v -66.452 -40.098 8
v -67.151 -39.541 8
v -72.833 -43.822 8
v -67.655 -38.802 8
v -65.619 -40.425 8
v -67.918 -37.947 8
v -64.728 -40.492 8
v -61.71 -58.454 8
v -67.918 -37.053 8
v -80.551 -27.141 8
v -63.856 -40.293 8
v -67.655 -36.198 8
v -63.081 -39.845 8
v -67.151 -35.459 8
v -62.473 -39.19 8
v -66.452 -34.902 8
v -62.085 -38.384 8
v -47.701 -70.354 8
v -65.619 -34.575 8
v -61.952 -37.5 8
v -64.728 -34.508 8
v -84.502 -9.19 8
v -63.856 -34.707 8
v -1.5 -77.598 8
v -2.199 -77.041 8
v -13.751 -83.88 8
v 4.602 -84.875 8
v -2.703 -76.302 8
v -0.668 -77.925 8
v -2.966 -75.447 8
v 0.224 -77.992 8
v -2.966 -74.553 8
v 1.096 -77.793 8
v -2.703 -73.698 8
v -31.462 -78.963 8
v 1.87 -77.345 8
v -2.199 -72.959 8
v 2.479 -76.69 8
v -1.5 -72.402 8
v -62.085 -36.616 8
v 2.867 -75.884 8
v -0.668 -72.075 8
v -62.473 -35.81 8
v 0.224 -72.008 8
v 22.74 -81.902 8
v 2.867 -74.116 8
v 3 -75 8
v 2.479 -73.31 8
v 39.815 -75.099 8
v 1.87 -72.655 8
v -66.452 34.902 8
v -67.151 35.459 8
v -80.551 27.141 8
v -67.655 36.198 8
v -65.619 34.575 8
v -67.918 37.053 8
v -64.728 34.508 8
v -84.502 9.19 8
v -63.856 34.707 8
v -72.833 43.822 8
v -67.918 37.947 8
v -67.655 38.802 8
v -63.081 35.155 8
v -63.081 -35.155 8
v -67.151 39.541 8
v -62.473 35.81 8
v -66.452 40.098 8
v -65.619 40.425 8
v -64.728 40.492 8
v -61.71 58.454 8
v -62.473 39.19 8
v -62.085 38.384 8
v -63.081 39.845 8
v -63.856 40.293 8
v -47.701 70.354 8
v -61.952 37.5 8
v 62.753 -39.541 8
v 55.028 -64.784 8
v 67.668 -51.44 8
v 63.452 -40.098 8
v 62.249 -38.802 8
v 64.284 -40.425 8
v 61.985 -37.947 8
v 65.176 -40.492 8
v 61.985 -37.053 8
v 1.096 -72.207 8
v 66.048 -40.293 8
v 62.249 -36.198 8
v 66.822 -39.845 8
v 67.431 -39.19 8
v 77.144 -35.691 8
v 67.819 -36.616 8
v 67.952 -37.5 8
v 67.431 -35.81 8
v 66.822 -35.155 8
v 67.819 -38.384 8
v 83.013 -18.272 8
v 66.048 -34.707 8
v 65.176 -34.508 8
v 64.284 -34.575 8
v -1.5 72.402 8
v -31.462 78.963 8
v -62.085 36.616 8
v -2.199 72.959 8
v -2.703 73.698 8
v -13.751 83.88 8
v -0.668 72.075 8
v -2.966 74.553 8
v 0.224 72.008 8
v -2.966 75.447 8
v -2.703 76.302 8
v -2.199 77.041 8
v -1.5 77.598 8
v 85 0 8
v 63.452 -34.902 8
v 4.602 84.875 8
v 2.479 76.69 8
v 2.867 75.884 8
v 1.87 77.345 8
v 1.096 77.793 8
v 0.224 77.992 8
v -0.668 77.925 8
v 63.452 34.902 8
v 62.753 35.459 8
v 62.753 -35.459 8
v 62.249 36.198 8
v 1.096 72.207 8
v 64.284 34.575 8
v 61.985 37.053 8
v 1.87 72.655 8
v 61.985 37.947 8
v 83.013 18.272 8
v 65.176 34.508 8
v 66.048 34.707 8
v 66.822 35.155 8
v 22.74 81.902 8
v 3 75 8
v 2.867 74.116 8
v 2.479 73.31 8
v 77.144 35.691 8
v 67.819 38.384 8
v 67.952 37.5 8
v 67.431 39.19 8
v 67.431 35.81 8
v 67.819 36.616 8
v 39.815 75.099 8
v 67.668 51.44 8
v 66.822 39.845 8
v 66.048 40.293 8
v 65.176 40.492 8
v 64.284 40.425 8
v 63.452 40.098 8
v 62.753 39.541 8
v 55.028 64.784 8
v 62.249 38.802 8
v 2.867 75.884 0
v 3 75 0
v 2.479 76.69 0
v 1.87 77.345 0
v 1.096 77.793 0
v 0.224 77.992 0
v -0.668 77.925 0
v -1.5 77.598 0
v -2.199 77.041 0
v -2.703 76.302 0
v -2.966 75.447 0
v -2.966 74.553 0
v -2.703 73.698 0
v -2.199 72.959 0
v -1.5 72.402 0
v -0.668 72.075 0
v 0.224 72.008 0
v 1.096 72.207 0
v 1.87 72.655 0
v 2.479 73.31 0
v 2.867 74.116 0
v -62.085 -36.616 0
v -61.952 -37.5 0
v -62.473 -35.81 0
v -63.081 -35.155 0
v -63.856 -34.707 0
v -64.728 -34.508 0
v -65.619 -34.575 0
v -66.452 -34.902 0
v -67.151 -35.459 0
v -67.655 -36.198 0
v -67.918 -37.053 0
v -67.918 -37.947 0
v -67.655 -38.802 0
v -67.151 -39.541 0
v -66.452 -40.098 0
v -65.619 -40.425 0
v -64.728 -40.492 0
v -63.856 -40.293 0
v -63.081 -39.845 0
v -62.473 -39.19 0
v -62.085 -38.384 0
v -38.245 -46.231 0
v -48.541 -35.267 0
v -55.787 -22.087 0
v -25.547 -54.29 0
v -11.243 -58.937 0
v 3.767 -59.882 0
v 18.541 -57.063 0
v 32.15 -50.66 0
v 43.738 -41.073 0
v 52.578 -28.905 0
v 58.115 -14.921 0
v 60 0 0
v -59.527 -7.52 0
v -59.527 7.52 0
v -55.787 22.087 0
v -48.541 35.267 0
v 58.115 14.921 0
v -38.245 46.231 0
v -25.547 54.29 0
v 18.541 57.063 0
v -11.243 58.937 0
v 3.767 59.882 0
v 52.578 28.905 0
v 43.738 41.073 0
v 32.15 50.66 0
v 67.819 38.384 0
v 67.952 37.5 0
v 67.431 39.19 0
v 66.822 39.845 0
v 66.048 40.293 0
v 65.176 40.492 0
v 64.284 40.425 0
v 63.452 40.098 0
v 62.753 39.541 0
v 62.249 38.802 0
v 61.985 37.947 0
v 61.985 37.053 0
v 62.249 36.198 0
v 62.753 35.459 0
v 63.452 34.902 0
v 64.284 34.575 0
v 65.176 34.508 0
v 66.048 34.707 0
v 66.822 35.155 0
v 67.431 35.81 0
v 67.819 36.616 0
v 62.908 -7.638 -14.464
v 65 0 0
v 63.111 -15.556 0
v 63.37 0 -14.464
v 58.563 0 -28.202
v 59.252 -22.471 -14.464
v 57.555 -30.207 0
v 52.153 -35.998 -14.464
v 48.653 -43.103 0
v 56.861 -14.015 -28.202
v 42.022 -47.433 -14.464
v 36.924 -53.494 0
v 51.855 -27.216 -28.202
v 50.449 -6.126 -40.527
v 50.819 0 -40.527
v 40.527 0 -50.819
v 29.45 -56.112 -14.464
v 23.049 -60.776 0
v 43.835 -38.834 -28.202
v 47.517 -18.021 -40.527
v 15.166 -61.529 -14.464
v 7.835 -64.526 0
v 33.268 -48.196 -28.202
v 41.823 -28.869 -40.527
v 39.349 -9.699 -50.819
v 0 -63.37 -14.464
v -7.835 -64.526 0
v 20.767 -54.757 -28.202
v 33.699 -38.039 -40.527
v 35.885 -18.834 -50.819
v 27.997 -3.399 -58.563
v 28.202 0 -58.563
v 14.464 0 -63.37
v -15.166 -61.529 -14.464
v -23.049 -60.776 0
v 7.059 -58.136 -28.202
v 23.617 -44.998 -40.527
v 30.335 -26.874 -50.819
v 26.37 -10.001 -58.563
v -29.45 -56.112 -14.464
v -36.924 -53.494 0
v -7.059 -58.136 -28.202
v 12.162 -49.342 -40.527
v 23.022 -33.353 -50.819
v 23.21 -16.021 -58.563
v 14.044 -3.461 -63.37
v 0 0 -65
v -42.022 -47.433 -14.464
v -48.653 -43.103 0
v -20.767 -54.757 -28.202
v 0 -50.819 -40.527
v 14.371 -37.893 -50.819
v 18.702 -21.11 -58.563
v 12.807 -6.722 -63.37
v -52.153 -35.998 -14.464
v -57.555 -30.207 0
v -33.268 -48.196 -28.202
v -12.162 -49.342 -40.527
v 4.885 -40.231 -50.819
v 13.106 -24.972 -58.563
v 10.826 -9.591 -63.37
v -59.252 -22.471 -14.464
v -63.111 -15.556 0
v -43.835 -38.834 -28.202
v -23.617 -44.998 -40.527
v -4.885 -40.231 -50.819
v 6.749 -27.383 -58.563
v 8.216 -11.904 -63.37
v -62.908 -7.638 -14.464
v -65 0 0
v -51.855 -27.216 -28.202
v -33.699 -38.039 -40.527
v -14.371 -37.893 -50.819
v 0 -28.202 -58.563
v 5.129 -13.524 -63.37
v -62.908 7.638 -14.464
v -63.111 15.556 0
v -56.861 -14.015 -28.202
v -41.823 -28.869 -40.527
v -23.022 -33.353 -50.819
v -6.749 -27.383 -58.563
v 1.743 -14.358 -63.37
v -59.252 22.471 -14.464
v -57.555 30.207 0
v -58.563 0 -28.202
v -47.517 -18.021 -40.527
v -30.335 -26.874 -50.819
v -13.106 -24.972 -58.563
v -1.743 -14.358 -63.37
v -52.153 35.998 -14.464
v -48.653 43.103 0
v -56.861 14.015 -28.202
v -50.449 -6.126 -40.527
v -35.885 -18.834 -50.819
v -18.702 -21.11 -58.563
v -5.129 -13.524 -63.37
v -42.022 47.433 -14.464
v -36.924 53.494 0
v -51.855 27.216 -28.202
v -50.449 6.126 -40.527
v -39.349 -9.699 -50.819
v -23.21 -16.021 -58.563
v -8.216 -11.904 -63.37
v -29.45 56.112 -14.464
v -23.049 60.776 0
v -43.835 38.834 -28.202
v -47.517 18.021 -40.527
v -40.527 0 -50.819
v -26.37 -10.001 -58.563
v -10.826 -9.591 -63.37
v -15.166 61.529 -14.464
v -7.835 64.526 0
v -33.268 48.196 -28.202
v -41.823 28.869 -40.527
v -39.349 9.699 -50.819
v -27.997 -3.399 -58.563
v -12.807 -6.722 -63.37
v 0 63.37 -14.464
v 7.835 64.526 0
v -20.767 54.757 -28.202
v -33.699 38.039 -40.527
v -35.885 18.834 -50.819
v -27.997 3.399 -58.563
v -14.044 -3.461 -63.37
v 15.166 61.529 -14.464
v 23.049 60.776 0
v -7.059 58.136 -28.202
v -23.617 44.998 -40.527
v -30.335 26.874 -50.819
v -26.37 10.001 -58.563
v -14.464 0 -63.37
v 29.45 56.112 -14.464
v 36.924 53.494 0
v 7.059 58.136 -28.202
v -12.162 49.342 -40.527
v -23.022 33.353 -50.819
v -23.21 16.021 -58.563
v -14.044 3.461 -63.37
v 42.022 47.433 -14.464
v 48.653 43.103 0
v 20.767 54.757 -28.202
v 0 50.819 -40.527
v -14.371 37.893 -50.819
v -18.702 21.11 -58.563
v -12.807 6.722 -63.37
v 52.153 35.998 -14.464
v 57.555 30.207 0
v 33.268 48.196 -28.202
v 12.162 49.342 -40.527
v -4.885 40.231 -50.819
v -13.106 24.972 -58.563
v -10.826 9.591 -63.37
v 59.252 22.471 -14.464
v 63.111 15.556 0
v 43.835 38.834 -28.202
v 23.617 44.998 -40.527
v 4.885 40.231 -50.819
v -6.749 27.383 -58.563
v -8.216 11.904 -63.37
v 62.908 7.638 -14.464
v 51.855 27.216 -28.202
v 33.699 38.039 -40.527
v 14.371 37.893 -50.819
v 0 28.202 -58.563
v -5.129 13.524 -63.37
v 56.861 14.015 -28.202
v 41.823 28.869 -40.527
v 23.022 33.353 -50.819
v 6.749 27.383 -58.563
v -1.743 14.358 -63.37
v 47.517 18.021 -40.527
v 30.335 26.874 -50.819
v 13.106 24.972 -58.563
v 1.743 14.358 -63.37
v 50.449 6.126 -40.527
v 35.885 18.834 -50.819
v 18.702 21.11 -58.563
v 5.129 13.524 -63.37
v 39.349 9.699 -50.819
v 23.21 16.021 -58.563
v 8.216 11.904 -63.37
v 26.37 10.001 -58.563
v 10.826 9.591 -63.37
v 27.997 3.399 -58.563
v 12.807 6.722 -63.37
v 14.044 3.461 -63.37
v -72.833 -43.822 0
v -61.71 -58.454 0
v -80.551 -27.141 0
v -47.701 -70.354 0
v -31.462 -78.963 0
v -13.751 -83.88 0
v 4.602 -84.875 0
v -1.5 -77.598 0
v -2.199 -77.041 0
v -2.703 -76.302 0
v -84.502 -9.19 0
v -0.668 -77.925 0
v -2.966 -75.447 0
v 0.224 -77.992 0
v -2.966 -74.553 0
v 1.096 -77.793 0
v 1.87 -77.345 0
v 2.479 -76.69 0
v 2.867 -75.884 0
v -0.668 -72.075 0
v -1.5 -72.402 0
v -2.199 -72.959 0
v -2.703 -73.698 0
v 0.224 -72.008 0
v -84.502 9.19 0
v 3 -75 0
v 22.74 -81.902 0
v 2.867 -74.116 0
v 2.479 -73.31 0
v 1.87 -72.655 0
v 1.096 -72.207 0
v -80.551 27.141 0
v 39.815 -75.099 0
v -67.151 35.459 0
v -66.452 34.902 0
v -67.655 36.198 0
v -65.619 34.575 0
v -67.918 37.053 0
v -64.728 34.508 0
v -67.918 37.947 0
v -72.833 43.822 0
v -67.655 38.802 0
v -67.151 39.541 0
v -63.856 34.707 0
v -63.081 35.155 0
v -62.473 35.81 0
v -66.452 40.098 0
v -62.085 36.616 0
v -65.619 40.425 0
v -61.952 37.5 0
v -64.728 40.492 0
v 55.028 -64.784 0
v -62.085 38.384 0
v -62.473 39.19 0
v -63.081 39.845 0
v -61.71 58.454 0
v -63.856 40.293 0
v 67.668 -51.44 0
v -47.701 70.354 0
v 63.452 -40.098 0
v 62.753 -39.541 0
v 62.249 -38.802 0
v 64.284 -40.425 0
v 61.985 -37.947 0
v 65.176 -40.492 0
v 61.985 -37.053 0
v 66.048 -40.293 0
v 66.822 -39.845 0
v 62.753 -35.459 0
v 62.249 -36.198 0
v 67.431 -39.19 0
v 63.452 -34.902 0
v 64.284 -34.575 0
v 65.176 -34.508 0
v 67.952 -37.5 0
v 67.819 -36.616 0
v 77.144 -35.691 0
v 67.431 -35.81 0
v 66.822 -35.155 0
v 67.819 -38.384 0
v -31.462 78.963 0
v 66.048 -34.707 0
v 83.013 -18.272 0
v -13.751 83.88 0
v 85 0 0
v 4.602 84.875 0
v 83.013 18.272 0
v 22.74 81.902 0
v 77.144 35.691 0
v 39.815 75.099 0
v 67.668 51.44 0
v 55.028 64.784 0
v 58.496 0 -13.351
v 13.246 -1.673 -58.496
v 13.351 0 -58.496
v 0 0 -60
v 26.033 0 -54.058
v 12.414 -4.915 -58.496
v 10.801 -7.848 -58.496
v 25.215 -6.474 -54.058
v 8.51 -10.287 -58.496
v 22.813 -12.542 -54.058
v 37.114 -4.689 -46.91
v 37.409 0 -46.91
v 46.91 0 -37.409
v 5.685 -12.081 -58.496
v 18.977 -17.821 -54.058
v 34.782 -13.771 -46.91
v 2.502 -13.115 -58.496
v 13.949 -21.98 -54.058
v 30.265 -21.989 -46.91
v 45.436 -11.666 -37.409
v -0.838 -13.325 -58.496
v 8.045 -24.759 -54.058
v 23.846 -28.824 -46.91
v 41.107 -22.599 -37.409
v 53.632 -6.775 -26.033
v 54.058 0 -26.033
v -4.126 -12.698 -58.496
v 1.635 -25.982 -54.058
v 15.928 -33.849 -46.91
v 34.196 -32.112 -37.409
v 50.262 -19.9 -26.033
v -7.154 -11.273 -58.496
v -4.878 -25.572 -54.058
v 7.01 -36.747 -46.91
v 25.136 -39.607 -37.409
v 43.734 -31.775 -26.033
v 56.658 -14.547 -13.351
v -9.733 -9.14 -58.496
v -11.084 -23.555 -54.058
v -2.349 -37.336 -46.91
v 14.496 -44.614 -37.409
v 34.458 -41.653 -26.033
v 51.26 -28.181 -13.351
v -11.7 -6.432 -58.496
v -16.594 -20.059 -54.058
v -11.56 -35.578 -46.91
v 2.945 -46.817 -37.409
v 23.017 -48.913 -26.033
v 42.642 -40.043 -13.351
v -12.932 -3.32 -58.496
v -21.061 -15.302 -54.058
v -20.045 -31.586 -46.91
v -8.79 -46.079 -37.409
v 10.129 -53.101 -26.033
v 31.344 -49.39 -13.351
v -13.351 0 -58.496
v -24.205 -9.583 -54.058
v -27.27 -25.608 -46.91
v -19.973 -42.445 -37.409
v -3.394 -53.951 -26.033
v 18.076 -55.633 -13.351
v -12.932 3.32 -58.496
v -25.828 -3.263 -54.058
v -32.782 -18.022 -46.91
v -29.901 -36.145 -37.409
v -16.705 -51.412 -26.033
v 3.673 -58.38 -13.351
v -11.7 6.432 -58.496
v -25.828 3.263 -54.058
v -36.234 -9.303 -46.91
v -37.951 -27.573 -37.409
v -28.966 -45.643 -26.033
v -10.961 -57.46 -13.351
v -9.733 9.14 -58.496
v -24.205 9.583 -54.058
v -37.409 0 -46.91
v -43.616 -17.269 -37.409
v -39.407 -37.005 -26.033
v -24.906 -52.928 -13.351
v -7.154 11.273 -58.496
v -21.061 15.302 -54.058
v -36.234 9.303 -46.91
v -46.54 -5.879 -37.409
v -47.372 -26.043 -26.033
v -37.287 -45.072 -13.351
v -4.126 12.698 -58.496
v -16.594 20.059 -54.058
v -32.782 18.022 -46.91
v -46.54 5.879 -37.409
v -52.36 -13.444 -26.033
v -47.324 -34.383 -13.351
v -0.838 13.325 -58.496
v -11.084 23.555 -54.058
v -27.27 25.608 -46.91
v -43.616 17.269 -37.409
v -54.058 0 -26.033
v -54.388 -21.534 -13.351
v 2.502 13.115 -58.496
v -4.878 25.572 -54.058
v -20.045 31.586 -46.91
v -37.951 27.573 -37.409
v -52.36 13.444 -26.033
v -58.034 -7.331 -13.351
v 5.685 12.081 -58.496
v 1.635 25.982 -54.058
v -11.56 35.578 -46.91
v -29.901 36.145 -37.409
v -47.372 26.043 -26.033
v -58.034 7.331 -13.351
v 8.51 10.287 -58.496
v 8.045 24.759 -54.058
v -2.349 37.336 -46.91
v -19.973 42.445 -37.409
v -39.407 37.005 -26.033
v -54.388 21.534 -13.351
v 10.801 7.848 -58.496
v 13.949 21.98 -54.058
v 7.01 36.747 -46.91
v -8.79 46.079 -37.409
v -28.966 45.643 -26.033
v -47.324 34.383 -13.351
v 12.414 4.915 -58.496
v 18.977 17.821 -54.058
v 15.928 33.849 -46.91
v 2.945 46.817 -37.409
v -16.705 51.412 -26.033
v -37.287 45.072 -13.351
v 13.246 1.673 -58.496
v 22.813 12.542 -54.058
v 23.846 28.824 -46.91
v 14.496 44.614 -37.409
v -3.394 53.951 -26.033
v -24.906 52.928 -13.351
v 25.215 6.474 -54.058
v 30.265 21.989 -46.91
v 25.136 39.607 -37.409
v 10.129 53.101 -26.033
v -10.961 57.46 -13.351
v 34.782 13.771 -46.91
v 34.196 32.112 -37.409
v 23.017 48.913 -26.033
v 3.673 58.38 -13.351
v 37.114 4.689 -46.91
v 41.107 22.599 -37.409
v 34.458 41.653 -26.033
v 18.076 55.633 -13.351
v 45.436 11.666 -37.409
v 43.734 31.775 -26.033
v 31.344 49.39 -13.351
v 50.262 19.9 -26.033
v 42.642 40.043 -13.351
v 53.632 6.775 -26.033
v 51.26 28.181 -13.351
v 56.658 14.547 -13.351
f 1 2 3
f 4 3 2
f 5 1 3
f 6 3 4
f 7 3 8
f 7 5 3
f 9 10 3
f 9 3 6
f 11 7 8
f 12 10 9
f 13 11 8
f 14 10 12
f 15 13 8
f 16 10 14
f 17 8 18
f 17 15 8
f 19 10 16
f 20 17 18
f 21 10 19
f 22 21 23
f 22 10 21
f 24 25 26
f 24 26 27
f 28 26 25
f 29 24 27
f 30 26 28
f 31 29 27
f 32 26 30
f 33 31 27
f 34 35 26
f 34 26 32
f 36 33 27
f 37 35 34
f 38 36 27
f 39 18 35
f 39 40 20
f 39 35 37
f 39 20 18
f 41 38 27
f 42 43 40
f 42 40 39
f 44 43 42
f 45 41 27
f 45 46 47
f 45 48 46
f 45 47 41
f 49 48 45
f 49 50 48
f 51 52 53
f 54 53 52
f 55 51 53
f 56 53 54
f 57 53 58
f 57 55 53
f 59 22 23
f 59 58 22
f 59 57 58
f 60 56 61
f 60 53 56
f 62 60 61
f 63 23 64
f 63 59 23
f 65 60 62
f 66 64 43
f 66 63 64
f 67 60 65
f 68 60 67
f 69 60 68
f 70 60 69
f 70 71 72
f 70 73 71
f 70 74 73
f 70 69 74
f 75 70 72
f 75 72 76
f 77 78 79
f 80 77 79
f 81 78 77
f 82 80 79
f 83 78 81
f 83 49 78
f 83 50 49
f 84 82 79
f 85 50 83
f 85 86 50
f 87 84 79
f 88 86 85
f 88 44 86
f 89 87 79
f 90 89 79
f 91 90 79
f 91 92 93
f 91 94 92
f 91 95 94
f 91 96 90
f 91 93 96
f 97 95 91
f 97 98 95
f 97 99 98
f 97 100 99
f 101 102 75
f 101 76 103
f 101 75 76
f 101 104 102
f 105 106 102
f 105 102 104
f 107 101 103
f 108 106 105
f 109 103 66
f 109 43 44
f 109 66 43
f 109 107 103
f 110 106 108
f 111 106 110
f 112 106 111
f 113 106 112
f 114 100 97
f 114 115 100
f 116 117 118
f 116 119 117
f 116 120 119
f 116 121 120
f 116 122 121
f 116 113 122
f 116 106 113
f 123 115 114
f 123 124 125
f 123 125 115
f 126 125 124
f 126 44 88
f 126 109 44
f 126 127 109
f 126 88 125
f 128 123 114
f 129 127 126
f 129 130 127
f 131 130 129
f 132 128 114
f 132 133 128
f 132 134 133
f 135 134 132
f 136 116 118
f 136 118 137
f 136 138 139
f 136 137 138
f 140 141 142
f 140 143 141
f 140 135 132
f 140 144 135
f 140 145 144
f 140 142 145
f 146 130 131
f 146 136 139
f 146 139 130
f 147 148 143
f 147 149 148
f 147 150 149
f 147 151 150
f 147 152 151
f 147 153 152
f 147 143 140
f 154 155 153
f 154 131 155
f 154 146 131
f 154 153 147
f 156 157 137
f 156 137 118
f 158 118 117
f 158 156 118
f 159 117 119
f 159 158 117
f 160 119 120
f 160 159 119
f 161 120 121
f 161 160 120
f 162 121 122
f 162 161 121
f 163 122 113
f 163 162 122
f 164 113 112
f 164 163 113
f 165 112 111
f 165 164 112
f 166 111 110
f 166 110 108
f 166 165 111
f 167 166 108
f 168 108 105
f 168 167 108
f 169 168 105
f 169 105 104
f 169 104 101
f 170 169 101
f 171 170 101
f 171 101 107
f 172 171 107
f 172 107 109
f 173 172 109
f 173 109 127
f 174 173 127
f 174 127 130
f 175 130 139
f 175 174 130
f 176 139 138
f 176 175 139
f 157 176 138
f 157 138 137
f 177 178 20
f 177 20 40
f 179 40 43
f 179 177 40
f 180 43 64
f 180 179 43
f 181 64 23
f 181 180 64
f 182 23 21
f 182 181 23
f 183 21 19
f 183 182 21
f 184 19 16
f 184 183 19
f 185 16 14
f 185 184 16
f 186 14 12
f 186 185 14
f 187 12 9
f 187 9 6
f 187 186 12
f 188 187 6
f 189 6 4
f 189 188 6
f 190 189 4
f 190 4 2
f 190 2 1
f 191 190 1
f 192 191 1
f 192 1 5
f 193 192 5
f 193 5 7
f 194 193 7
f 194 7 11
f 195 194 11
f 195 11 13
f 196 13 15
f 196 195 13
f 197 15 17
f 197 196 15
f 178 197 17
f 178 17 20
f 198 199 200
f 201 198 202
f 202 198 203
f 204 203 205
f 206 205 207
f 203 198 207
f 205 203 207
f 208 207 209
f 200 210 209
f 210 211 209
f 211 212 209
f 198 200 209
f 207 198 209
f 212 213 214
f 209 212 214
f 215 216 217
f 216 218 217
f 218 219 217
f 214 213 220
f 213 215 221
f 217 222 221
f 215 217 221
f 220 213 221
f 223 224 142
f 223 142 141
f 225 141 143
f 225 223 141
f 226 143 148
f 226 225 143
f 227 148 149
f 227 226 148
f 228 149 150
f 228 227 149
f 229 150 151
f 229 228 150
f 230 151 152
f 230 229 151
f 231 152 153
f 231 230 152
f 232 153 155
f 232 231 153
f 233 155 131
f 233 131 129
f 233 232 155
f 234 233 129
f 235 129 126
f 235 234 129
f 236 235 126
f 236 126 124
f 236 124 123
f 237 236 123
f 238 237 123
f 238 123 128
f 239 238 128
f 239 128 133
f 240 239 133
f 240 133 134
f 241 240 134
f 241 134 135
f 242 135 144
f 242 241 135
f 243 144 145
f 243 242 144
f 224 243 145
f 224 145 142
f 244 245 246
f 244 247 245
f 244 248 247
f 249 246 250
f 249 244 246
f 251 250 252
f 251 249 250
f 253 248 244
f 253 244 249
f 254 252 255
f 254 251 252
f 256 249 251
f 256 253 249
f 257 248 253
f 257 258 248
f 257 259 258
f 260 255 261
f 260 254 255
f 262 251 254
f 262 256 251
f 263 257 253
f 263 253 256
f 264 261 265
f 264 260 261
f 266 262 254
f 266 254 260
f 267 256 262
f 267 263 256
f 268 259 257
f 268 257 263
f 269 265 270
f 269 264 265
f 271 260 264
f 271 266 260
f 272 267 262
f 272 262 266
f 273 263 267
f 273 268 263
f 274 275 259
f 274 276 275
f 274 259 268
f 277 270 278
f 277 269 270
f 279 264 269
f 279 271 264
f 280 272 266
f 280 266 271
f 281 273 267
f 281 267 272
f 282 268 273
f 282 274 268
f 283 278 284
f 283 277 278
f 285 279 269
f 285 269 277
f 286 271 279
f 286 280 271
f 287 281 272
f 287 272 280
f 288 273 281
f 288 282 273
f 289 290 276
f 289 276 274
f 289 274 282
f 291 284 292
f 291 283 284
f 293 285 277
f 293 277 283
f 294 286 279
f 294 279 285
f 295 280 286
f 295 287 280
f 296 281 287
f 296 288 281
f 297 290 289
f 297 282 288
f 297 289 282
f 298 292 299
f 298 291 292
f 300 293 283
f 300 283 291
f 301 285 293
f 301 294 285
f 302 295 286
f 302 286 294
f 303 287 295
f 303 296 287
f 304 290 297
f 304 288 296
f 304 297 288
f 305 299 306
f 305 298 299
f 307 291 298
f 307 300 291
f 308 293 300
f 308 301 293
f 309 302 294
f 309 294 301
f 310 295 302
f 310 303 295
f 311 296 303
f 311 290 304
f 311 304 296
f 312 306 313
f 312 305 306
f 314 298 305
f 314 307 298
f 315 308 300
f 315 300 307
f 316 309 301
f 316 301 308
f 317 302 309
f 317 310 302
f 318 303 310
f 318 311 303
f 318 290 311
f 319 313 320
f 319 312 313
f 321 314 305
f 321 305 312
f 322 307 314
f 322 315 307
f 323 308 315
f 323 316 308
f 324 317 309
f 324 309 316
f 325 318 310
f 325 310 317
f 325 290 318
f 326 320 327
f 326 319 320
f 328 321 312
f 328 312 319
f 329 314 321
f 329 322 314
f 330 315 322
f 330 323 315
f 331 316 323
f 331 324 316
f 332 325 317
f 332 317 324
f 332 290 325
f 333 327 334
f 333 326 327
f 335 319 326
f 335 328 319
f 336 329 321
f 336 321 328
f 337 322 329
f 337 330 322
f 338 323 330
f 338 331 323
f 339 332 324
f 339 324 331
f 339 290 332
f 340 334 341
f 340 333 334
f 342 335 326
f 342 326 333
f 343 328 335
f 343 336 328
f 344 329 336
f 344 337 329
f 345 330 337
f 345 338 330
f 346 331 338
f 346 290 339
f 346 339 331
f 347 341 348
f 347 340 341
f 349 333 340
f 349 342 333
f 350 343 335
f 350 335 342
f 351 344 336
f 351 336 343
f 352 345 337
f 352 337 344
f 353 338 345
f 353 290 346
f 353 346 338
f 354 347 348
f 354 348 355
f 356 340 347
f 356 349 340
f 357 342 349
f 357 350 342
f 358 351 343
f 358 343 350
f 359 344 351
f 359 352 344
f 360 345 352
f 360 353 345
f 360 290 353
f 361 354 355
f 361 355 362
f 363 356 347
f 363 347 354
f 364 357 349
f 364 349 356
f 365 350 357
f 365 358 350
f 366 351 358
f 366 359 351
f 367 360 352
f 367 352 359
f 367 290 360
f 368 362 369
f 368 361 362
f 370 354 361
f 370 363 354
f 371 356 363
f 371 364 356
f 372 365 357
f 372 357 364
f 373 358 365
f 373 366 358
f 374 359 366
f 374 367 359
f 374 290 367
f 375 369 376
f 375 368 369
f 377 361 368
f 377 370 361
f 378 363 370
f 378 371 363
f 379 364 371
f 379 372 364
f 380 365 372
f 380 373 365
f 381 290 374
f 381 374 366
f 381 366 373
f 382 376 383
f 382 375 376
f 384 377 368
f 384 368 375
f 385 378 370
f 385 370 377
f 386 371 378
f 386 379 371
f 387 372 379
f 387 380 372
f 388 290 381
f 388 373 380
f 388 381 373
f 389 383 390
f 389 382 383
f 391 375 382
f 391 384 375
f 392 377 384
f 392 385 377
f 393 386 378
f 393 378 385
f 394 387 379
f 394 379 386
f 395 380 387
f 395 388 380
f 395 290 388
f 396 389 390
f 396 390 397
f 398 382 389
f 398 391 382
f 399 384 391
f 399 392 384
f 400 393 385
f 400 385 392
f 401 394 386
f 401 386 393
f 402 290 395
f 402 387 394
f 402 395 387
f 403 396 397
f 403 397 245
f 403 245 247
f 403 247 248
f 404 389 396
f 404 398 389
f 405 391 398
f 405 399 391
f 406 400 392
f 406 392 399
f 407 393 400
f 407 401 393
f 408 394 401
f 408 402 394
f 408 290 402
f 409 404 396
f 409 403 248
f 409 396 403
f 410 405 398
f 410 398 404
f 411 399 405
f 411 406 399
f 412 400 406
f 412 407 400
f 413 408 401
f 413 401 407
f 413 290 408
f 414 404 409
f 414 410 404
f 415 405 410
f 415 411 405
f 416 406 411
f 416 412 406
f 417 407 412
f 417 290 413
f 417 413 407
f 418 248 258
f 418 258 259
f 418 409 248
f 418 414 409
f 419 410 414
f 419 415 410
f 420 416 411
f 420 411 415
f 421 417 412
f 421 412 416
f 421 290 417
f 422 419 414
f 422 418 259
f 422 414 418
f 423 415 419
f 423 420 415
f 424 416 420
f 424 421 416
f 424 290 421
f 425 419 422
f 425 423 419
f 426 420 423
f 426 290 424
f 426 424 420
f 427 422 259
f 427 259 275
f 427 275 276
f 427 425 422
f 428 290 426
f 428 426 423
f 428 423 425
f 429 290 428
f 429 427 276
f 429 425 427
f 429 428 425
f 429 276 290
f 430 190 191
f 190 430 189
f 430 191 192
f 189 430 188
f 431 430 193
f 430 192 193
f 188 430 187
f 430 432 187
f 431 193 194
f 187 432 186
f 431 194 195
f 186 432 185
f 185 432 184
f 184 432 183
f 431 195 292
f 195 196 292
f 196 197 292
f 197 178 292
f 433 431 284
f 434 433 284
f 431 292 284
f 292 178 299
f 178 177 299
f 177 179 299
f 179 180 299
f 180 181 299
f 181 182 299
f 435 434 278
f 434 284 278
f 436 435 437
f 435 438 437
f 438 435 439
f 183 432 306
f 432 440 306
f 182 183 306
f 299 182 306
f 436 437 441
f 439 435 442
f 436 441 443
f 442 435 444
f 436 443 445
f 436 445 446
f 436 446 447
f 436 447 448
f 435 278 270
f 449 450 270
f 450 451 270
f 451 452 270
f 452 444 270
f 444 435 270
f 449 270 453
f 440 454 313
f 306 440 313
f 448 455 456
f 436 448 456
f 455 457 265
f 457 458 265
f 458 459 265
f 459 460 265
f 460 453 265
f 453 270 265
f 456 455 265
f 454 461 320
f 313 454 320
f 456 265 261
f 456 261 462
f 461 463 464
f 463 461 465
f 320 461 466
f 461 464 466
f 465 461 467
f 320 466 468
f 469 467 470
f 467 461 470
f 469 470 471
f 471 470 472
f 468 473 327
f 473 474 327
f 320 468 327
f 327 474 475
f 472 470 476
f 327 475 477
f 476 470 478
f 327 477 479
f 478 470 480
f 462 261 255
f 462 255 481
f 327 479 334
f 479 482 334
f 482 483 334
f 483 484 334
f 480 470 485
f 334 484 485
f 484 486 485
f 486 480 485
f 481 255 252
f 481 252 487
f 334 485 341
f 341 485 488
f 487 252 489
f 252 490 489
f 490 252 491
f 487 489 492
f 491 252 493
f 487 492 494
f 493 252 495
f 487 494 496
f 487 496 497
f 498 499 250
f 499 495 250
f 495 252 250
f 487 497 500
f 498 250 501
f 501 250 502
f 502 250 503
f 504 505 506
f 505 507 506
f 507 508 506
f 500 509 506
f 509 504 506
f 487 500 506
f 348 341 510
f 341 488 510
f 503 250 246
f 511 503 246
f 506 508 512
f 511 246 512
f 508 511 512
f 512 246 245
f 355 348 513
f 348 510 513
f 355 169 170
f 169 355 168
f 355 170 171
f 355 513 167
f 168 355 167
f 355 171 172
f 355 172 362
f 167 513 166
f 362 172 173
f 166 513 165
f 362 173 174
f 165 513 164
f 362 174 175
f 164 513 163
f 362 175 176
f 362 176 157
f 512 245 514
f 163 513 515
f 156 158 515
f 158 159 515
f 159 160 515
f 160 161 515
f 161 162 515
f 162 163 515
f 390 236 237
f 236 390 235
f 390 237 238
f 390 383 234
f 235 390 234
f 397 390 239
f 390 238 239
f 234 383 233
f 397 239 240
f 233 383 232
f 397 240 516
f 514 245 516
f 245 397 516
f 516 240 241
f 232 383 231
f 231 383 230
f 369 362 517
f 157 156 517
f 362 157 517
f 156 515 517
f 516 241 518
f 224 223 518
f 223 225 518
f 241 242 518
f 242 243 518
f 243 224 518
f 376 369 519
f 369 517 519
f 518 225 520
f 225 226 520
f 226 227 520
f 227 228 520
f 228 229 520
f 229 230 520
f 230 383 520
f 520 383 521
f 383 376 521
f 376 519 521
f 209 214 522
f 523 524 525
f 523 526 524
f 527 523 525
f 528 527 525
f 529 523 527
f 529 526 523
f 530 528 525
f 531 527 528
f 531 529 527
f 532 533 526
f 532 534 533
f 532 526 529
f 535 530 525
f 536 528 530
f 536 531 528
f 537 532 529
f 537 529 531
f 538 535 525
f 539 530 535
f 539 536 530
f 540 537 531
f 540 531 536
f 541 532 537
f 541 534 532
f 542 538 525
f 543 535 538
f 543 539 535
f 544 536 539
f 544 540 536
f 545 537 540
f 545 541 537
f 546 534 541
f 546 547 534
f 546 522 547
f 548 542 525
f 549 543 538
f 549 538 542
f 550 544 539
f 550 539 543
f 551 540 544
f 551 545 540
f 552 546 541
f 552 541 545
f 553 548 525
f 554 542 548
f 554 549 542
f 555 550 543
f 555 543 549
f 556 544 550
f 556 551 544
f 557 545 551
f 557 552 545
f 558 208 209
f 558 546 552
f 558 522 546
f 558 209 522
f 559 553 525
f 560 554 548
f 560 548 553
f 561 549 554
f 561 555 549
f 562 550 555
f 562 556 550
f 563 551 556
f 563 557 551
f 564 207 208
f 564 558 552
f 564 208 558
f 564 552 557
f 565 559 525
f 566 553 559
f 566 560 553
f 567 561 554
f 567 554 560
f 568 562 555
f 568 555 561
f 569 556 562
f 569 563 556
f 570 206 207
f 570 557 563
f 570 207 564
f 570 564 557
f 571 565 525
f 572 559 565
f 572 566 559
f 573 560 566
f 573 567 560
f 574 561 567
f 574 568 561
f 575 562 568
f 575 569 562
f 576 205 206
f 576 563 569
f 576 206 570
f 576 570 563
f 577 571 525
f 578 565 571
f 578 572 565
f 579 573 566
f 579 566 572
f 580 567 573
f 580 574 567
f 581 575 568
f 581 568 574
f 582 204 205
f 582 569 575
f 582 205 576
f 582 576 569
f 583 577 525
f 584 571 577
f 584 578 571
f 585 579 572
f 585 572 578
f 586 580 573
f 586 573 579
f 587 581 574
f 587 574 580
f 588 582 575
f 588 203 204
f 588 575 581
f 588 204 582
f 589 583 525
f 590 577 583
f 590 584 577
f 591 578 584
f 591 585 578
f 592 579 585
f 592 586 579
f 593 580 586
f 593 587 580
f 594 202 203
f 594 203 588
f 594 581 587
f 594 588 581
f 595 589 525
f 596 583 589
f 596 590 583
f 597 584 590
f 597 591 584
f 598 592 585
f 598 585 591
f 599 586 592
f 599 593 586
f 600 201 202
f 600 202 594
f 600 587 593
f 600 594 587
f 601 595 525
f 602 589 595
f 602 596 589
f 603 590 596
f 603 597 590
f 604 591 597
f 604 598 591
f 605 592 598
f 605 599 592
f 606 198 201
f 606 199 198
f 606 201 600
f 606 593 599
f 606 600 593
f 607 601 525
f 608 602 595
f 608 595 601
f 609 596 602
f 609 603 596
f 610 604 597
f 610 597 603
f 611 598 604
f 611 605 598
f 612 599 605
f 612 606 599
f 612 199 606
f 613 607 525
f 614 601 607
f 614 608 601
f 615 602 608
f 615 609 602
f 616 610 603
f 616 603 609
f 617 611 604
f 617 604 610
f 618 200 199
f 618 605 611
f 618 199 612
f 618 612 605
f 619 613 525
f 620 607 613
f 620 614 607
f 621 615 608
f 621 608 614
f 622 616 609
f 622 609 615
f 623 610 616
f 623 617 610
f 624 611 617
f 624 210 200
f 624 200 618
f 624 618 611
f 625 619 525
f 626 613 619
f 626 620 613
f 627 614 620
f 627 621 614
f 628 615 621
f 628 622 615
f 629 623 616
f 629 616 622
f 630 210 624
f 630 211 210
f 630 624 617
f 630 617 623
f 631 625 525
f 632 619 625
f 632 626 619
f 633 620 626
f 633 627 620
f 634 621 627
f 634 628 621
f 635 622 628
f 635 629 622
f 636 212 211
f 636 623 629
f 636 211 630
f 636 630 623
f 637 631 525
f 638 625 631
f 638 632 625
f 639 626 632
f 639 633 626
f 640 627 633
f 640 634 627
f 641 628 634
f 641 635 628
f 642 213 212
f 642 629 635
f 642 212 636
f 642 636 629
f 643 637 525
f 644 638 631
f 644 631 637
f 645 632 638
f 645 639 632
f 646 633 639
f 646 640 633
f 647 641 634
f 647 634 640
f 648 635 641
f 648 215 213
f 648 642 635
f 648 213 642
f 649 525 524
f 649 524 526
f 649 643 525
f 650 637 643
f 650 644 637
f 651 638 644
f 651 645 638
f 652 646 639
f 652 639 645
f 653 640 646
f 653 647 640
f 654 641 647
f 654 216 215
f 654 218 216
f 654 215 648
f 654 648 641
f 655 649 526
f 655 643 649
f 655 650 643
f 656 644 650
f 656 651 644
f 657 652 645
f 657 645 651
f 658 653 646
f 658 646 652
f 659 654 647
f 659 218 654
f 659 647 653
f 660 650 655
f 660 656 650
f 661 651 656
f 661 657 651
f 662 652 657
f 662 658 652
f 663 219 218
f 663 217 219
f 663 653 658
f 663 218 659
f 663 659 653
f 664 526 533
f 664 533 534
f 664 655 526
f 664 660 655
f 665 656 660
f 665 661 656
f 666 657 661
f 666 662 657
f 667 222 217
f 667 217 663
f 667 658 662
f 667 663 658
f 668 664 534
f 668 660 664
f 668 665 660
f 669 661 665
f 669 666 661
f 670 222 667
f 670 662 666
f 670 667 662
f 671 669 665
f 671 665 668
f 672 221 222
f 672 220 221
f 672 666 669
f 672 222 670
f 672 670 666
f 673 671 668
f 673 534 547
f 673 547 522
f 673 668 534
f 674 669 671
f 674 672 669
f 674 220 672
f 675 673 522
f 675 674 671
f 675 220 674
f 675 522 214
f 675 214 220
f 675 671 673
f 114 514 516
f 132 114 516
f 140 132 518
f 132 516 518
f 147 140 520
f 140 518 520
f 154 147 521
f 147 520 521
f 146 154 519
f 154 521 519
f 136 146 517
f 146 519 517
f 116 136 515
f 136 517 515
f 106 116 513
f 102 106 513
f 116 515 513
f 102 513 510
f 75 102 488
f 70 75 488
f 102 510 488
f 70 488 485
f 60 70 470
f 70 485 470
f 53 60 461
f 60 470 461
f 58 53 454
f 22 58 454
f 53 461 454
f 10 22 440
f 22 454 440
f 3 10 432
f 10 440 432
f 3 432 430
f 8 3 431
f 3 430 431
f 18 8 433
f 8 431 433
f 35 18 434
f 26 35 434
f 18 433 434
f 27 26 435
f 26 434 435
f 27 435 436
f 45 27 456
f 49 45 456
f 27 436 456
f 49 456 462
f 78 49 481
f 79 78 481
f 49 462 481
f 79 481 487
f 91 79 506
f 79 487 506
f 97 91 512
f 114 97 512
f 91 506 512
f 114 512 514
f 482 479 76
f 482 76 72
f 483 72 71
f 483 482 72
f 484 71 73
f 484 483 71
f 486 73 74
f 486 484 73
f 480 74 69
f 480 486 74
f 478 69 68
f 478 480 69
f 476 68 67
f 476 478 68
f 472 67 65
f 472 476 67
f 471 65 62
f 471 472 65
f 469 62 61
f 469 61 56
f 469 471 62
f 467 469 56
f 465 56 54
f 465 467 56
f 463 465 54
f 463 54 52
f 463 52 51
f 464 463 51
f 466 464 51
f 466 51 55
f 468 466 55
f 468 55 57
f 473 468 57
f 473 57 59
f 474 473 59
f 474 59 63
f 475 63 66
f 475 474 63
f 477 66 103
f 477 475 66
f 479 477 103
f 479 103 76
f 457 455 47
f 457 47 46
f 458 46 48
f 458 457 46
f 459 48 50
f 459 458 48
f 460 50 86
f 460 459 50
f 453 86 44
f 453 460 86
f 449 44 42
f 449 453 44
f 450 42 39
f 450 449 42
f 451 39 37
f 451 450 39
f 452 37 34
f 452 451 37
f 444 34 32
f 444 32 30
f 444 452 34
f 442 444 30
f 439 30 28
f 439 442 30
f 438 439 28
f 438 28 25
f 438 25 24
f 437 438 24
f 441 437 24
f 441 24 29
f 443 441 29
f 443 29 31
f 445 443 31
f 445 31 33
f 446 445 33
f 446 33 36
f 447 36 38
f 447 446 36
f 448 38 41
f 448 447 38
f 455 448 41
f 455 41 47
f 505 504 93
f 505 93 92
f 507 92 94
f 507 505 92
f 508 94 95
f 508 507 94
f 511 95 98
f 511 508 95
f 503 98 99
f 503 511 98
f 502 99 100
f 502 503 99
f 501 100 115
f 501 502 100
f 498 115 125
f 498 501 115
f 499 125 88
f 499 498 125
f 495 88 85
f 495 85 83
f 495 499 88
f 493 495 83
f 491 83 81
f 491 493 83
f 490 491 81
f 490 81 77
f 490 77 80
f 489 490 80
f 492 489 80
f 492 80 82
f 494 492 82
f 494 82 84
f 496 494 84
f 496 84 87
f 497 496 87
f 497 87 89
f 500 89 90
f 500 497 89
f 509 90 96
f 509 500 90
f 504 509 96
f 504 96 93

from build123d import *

# Parameters (mm, degrees)
SKETCH_1_R      = 85
SKETCH_1_R_2    = 3
EXTRUDE_1_DEPTH = 8


with BuildPart() as part:
    # 草图1 → 凸台-拉伸1 (new body)
    with BuildSketch(Plane.XY):
        Circle(SKETCH_1_R)
        with Locations((0, 75)):
            Circle(SKETCH_1_R_2, mode=Mode.SUBTRACT)
        with Locations((64.951905284, 37.5)):
            Circle(SKETCH_1_R_2, mode=Mode.SUBTRACT)
        with Locations((64.951905284, -37.5)):
            Circle(SKETCH_1_R_2, mode=Mode.SUBTRACT)
        with Locations((0, -75)):
            Circle(SKETCH_1_R_2, mode=Mode.SUBTRACT)
        with Locations((-64.951905284, -37.5)):
            Circle(SKETCH_1_R_2, mode=Mode.SUBTRACT)
        with Locations((-64.951905284, 37.5)):
            Circle(SKETCH_1_R_2, mode=Mode.SUBTRACT)
    extrude(amount=EXTRUDE_1_DEPTH)

    # 草图2 → 旋转1 (revolve)
    with BuildSketch(Plane(origin=(0, 0, 0), x_dir=(1, 0, 0), z_dir=(0, 1, 0)), mode=Mode.PRIVATE) as revolve_1_sk:
        with BuildLine():
            Line((-60, 0), (-65, 0))
            ThreePointArc((-65, 0), (-45.961940777, 45.961940777), (0, 65))
            Line((0, 65), (0, 60))
            ThreePointArc((0, 60), (-42.426406871, 42.426406871), (-60, 0))
        make_face()
    revolve(revolve_1_sk.sketch.rotate(Axis((0, 0, -60), (0, 0, -1)), 180), axis=Axis((0, 0, -60), (0, 0, -1)))


solid = part.part
